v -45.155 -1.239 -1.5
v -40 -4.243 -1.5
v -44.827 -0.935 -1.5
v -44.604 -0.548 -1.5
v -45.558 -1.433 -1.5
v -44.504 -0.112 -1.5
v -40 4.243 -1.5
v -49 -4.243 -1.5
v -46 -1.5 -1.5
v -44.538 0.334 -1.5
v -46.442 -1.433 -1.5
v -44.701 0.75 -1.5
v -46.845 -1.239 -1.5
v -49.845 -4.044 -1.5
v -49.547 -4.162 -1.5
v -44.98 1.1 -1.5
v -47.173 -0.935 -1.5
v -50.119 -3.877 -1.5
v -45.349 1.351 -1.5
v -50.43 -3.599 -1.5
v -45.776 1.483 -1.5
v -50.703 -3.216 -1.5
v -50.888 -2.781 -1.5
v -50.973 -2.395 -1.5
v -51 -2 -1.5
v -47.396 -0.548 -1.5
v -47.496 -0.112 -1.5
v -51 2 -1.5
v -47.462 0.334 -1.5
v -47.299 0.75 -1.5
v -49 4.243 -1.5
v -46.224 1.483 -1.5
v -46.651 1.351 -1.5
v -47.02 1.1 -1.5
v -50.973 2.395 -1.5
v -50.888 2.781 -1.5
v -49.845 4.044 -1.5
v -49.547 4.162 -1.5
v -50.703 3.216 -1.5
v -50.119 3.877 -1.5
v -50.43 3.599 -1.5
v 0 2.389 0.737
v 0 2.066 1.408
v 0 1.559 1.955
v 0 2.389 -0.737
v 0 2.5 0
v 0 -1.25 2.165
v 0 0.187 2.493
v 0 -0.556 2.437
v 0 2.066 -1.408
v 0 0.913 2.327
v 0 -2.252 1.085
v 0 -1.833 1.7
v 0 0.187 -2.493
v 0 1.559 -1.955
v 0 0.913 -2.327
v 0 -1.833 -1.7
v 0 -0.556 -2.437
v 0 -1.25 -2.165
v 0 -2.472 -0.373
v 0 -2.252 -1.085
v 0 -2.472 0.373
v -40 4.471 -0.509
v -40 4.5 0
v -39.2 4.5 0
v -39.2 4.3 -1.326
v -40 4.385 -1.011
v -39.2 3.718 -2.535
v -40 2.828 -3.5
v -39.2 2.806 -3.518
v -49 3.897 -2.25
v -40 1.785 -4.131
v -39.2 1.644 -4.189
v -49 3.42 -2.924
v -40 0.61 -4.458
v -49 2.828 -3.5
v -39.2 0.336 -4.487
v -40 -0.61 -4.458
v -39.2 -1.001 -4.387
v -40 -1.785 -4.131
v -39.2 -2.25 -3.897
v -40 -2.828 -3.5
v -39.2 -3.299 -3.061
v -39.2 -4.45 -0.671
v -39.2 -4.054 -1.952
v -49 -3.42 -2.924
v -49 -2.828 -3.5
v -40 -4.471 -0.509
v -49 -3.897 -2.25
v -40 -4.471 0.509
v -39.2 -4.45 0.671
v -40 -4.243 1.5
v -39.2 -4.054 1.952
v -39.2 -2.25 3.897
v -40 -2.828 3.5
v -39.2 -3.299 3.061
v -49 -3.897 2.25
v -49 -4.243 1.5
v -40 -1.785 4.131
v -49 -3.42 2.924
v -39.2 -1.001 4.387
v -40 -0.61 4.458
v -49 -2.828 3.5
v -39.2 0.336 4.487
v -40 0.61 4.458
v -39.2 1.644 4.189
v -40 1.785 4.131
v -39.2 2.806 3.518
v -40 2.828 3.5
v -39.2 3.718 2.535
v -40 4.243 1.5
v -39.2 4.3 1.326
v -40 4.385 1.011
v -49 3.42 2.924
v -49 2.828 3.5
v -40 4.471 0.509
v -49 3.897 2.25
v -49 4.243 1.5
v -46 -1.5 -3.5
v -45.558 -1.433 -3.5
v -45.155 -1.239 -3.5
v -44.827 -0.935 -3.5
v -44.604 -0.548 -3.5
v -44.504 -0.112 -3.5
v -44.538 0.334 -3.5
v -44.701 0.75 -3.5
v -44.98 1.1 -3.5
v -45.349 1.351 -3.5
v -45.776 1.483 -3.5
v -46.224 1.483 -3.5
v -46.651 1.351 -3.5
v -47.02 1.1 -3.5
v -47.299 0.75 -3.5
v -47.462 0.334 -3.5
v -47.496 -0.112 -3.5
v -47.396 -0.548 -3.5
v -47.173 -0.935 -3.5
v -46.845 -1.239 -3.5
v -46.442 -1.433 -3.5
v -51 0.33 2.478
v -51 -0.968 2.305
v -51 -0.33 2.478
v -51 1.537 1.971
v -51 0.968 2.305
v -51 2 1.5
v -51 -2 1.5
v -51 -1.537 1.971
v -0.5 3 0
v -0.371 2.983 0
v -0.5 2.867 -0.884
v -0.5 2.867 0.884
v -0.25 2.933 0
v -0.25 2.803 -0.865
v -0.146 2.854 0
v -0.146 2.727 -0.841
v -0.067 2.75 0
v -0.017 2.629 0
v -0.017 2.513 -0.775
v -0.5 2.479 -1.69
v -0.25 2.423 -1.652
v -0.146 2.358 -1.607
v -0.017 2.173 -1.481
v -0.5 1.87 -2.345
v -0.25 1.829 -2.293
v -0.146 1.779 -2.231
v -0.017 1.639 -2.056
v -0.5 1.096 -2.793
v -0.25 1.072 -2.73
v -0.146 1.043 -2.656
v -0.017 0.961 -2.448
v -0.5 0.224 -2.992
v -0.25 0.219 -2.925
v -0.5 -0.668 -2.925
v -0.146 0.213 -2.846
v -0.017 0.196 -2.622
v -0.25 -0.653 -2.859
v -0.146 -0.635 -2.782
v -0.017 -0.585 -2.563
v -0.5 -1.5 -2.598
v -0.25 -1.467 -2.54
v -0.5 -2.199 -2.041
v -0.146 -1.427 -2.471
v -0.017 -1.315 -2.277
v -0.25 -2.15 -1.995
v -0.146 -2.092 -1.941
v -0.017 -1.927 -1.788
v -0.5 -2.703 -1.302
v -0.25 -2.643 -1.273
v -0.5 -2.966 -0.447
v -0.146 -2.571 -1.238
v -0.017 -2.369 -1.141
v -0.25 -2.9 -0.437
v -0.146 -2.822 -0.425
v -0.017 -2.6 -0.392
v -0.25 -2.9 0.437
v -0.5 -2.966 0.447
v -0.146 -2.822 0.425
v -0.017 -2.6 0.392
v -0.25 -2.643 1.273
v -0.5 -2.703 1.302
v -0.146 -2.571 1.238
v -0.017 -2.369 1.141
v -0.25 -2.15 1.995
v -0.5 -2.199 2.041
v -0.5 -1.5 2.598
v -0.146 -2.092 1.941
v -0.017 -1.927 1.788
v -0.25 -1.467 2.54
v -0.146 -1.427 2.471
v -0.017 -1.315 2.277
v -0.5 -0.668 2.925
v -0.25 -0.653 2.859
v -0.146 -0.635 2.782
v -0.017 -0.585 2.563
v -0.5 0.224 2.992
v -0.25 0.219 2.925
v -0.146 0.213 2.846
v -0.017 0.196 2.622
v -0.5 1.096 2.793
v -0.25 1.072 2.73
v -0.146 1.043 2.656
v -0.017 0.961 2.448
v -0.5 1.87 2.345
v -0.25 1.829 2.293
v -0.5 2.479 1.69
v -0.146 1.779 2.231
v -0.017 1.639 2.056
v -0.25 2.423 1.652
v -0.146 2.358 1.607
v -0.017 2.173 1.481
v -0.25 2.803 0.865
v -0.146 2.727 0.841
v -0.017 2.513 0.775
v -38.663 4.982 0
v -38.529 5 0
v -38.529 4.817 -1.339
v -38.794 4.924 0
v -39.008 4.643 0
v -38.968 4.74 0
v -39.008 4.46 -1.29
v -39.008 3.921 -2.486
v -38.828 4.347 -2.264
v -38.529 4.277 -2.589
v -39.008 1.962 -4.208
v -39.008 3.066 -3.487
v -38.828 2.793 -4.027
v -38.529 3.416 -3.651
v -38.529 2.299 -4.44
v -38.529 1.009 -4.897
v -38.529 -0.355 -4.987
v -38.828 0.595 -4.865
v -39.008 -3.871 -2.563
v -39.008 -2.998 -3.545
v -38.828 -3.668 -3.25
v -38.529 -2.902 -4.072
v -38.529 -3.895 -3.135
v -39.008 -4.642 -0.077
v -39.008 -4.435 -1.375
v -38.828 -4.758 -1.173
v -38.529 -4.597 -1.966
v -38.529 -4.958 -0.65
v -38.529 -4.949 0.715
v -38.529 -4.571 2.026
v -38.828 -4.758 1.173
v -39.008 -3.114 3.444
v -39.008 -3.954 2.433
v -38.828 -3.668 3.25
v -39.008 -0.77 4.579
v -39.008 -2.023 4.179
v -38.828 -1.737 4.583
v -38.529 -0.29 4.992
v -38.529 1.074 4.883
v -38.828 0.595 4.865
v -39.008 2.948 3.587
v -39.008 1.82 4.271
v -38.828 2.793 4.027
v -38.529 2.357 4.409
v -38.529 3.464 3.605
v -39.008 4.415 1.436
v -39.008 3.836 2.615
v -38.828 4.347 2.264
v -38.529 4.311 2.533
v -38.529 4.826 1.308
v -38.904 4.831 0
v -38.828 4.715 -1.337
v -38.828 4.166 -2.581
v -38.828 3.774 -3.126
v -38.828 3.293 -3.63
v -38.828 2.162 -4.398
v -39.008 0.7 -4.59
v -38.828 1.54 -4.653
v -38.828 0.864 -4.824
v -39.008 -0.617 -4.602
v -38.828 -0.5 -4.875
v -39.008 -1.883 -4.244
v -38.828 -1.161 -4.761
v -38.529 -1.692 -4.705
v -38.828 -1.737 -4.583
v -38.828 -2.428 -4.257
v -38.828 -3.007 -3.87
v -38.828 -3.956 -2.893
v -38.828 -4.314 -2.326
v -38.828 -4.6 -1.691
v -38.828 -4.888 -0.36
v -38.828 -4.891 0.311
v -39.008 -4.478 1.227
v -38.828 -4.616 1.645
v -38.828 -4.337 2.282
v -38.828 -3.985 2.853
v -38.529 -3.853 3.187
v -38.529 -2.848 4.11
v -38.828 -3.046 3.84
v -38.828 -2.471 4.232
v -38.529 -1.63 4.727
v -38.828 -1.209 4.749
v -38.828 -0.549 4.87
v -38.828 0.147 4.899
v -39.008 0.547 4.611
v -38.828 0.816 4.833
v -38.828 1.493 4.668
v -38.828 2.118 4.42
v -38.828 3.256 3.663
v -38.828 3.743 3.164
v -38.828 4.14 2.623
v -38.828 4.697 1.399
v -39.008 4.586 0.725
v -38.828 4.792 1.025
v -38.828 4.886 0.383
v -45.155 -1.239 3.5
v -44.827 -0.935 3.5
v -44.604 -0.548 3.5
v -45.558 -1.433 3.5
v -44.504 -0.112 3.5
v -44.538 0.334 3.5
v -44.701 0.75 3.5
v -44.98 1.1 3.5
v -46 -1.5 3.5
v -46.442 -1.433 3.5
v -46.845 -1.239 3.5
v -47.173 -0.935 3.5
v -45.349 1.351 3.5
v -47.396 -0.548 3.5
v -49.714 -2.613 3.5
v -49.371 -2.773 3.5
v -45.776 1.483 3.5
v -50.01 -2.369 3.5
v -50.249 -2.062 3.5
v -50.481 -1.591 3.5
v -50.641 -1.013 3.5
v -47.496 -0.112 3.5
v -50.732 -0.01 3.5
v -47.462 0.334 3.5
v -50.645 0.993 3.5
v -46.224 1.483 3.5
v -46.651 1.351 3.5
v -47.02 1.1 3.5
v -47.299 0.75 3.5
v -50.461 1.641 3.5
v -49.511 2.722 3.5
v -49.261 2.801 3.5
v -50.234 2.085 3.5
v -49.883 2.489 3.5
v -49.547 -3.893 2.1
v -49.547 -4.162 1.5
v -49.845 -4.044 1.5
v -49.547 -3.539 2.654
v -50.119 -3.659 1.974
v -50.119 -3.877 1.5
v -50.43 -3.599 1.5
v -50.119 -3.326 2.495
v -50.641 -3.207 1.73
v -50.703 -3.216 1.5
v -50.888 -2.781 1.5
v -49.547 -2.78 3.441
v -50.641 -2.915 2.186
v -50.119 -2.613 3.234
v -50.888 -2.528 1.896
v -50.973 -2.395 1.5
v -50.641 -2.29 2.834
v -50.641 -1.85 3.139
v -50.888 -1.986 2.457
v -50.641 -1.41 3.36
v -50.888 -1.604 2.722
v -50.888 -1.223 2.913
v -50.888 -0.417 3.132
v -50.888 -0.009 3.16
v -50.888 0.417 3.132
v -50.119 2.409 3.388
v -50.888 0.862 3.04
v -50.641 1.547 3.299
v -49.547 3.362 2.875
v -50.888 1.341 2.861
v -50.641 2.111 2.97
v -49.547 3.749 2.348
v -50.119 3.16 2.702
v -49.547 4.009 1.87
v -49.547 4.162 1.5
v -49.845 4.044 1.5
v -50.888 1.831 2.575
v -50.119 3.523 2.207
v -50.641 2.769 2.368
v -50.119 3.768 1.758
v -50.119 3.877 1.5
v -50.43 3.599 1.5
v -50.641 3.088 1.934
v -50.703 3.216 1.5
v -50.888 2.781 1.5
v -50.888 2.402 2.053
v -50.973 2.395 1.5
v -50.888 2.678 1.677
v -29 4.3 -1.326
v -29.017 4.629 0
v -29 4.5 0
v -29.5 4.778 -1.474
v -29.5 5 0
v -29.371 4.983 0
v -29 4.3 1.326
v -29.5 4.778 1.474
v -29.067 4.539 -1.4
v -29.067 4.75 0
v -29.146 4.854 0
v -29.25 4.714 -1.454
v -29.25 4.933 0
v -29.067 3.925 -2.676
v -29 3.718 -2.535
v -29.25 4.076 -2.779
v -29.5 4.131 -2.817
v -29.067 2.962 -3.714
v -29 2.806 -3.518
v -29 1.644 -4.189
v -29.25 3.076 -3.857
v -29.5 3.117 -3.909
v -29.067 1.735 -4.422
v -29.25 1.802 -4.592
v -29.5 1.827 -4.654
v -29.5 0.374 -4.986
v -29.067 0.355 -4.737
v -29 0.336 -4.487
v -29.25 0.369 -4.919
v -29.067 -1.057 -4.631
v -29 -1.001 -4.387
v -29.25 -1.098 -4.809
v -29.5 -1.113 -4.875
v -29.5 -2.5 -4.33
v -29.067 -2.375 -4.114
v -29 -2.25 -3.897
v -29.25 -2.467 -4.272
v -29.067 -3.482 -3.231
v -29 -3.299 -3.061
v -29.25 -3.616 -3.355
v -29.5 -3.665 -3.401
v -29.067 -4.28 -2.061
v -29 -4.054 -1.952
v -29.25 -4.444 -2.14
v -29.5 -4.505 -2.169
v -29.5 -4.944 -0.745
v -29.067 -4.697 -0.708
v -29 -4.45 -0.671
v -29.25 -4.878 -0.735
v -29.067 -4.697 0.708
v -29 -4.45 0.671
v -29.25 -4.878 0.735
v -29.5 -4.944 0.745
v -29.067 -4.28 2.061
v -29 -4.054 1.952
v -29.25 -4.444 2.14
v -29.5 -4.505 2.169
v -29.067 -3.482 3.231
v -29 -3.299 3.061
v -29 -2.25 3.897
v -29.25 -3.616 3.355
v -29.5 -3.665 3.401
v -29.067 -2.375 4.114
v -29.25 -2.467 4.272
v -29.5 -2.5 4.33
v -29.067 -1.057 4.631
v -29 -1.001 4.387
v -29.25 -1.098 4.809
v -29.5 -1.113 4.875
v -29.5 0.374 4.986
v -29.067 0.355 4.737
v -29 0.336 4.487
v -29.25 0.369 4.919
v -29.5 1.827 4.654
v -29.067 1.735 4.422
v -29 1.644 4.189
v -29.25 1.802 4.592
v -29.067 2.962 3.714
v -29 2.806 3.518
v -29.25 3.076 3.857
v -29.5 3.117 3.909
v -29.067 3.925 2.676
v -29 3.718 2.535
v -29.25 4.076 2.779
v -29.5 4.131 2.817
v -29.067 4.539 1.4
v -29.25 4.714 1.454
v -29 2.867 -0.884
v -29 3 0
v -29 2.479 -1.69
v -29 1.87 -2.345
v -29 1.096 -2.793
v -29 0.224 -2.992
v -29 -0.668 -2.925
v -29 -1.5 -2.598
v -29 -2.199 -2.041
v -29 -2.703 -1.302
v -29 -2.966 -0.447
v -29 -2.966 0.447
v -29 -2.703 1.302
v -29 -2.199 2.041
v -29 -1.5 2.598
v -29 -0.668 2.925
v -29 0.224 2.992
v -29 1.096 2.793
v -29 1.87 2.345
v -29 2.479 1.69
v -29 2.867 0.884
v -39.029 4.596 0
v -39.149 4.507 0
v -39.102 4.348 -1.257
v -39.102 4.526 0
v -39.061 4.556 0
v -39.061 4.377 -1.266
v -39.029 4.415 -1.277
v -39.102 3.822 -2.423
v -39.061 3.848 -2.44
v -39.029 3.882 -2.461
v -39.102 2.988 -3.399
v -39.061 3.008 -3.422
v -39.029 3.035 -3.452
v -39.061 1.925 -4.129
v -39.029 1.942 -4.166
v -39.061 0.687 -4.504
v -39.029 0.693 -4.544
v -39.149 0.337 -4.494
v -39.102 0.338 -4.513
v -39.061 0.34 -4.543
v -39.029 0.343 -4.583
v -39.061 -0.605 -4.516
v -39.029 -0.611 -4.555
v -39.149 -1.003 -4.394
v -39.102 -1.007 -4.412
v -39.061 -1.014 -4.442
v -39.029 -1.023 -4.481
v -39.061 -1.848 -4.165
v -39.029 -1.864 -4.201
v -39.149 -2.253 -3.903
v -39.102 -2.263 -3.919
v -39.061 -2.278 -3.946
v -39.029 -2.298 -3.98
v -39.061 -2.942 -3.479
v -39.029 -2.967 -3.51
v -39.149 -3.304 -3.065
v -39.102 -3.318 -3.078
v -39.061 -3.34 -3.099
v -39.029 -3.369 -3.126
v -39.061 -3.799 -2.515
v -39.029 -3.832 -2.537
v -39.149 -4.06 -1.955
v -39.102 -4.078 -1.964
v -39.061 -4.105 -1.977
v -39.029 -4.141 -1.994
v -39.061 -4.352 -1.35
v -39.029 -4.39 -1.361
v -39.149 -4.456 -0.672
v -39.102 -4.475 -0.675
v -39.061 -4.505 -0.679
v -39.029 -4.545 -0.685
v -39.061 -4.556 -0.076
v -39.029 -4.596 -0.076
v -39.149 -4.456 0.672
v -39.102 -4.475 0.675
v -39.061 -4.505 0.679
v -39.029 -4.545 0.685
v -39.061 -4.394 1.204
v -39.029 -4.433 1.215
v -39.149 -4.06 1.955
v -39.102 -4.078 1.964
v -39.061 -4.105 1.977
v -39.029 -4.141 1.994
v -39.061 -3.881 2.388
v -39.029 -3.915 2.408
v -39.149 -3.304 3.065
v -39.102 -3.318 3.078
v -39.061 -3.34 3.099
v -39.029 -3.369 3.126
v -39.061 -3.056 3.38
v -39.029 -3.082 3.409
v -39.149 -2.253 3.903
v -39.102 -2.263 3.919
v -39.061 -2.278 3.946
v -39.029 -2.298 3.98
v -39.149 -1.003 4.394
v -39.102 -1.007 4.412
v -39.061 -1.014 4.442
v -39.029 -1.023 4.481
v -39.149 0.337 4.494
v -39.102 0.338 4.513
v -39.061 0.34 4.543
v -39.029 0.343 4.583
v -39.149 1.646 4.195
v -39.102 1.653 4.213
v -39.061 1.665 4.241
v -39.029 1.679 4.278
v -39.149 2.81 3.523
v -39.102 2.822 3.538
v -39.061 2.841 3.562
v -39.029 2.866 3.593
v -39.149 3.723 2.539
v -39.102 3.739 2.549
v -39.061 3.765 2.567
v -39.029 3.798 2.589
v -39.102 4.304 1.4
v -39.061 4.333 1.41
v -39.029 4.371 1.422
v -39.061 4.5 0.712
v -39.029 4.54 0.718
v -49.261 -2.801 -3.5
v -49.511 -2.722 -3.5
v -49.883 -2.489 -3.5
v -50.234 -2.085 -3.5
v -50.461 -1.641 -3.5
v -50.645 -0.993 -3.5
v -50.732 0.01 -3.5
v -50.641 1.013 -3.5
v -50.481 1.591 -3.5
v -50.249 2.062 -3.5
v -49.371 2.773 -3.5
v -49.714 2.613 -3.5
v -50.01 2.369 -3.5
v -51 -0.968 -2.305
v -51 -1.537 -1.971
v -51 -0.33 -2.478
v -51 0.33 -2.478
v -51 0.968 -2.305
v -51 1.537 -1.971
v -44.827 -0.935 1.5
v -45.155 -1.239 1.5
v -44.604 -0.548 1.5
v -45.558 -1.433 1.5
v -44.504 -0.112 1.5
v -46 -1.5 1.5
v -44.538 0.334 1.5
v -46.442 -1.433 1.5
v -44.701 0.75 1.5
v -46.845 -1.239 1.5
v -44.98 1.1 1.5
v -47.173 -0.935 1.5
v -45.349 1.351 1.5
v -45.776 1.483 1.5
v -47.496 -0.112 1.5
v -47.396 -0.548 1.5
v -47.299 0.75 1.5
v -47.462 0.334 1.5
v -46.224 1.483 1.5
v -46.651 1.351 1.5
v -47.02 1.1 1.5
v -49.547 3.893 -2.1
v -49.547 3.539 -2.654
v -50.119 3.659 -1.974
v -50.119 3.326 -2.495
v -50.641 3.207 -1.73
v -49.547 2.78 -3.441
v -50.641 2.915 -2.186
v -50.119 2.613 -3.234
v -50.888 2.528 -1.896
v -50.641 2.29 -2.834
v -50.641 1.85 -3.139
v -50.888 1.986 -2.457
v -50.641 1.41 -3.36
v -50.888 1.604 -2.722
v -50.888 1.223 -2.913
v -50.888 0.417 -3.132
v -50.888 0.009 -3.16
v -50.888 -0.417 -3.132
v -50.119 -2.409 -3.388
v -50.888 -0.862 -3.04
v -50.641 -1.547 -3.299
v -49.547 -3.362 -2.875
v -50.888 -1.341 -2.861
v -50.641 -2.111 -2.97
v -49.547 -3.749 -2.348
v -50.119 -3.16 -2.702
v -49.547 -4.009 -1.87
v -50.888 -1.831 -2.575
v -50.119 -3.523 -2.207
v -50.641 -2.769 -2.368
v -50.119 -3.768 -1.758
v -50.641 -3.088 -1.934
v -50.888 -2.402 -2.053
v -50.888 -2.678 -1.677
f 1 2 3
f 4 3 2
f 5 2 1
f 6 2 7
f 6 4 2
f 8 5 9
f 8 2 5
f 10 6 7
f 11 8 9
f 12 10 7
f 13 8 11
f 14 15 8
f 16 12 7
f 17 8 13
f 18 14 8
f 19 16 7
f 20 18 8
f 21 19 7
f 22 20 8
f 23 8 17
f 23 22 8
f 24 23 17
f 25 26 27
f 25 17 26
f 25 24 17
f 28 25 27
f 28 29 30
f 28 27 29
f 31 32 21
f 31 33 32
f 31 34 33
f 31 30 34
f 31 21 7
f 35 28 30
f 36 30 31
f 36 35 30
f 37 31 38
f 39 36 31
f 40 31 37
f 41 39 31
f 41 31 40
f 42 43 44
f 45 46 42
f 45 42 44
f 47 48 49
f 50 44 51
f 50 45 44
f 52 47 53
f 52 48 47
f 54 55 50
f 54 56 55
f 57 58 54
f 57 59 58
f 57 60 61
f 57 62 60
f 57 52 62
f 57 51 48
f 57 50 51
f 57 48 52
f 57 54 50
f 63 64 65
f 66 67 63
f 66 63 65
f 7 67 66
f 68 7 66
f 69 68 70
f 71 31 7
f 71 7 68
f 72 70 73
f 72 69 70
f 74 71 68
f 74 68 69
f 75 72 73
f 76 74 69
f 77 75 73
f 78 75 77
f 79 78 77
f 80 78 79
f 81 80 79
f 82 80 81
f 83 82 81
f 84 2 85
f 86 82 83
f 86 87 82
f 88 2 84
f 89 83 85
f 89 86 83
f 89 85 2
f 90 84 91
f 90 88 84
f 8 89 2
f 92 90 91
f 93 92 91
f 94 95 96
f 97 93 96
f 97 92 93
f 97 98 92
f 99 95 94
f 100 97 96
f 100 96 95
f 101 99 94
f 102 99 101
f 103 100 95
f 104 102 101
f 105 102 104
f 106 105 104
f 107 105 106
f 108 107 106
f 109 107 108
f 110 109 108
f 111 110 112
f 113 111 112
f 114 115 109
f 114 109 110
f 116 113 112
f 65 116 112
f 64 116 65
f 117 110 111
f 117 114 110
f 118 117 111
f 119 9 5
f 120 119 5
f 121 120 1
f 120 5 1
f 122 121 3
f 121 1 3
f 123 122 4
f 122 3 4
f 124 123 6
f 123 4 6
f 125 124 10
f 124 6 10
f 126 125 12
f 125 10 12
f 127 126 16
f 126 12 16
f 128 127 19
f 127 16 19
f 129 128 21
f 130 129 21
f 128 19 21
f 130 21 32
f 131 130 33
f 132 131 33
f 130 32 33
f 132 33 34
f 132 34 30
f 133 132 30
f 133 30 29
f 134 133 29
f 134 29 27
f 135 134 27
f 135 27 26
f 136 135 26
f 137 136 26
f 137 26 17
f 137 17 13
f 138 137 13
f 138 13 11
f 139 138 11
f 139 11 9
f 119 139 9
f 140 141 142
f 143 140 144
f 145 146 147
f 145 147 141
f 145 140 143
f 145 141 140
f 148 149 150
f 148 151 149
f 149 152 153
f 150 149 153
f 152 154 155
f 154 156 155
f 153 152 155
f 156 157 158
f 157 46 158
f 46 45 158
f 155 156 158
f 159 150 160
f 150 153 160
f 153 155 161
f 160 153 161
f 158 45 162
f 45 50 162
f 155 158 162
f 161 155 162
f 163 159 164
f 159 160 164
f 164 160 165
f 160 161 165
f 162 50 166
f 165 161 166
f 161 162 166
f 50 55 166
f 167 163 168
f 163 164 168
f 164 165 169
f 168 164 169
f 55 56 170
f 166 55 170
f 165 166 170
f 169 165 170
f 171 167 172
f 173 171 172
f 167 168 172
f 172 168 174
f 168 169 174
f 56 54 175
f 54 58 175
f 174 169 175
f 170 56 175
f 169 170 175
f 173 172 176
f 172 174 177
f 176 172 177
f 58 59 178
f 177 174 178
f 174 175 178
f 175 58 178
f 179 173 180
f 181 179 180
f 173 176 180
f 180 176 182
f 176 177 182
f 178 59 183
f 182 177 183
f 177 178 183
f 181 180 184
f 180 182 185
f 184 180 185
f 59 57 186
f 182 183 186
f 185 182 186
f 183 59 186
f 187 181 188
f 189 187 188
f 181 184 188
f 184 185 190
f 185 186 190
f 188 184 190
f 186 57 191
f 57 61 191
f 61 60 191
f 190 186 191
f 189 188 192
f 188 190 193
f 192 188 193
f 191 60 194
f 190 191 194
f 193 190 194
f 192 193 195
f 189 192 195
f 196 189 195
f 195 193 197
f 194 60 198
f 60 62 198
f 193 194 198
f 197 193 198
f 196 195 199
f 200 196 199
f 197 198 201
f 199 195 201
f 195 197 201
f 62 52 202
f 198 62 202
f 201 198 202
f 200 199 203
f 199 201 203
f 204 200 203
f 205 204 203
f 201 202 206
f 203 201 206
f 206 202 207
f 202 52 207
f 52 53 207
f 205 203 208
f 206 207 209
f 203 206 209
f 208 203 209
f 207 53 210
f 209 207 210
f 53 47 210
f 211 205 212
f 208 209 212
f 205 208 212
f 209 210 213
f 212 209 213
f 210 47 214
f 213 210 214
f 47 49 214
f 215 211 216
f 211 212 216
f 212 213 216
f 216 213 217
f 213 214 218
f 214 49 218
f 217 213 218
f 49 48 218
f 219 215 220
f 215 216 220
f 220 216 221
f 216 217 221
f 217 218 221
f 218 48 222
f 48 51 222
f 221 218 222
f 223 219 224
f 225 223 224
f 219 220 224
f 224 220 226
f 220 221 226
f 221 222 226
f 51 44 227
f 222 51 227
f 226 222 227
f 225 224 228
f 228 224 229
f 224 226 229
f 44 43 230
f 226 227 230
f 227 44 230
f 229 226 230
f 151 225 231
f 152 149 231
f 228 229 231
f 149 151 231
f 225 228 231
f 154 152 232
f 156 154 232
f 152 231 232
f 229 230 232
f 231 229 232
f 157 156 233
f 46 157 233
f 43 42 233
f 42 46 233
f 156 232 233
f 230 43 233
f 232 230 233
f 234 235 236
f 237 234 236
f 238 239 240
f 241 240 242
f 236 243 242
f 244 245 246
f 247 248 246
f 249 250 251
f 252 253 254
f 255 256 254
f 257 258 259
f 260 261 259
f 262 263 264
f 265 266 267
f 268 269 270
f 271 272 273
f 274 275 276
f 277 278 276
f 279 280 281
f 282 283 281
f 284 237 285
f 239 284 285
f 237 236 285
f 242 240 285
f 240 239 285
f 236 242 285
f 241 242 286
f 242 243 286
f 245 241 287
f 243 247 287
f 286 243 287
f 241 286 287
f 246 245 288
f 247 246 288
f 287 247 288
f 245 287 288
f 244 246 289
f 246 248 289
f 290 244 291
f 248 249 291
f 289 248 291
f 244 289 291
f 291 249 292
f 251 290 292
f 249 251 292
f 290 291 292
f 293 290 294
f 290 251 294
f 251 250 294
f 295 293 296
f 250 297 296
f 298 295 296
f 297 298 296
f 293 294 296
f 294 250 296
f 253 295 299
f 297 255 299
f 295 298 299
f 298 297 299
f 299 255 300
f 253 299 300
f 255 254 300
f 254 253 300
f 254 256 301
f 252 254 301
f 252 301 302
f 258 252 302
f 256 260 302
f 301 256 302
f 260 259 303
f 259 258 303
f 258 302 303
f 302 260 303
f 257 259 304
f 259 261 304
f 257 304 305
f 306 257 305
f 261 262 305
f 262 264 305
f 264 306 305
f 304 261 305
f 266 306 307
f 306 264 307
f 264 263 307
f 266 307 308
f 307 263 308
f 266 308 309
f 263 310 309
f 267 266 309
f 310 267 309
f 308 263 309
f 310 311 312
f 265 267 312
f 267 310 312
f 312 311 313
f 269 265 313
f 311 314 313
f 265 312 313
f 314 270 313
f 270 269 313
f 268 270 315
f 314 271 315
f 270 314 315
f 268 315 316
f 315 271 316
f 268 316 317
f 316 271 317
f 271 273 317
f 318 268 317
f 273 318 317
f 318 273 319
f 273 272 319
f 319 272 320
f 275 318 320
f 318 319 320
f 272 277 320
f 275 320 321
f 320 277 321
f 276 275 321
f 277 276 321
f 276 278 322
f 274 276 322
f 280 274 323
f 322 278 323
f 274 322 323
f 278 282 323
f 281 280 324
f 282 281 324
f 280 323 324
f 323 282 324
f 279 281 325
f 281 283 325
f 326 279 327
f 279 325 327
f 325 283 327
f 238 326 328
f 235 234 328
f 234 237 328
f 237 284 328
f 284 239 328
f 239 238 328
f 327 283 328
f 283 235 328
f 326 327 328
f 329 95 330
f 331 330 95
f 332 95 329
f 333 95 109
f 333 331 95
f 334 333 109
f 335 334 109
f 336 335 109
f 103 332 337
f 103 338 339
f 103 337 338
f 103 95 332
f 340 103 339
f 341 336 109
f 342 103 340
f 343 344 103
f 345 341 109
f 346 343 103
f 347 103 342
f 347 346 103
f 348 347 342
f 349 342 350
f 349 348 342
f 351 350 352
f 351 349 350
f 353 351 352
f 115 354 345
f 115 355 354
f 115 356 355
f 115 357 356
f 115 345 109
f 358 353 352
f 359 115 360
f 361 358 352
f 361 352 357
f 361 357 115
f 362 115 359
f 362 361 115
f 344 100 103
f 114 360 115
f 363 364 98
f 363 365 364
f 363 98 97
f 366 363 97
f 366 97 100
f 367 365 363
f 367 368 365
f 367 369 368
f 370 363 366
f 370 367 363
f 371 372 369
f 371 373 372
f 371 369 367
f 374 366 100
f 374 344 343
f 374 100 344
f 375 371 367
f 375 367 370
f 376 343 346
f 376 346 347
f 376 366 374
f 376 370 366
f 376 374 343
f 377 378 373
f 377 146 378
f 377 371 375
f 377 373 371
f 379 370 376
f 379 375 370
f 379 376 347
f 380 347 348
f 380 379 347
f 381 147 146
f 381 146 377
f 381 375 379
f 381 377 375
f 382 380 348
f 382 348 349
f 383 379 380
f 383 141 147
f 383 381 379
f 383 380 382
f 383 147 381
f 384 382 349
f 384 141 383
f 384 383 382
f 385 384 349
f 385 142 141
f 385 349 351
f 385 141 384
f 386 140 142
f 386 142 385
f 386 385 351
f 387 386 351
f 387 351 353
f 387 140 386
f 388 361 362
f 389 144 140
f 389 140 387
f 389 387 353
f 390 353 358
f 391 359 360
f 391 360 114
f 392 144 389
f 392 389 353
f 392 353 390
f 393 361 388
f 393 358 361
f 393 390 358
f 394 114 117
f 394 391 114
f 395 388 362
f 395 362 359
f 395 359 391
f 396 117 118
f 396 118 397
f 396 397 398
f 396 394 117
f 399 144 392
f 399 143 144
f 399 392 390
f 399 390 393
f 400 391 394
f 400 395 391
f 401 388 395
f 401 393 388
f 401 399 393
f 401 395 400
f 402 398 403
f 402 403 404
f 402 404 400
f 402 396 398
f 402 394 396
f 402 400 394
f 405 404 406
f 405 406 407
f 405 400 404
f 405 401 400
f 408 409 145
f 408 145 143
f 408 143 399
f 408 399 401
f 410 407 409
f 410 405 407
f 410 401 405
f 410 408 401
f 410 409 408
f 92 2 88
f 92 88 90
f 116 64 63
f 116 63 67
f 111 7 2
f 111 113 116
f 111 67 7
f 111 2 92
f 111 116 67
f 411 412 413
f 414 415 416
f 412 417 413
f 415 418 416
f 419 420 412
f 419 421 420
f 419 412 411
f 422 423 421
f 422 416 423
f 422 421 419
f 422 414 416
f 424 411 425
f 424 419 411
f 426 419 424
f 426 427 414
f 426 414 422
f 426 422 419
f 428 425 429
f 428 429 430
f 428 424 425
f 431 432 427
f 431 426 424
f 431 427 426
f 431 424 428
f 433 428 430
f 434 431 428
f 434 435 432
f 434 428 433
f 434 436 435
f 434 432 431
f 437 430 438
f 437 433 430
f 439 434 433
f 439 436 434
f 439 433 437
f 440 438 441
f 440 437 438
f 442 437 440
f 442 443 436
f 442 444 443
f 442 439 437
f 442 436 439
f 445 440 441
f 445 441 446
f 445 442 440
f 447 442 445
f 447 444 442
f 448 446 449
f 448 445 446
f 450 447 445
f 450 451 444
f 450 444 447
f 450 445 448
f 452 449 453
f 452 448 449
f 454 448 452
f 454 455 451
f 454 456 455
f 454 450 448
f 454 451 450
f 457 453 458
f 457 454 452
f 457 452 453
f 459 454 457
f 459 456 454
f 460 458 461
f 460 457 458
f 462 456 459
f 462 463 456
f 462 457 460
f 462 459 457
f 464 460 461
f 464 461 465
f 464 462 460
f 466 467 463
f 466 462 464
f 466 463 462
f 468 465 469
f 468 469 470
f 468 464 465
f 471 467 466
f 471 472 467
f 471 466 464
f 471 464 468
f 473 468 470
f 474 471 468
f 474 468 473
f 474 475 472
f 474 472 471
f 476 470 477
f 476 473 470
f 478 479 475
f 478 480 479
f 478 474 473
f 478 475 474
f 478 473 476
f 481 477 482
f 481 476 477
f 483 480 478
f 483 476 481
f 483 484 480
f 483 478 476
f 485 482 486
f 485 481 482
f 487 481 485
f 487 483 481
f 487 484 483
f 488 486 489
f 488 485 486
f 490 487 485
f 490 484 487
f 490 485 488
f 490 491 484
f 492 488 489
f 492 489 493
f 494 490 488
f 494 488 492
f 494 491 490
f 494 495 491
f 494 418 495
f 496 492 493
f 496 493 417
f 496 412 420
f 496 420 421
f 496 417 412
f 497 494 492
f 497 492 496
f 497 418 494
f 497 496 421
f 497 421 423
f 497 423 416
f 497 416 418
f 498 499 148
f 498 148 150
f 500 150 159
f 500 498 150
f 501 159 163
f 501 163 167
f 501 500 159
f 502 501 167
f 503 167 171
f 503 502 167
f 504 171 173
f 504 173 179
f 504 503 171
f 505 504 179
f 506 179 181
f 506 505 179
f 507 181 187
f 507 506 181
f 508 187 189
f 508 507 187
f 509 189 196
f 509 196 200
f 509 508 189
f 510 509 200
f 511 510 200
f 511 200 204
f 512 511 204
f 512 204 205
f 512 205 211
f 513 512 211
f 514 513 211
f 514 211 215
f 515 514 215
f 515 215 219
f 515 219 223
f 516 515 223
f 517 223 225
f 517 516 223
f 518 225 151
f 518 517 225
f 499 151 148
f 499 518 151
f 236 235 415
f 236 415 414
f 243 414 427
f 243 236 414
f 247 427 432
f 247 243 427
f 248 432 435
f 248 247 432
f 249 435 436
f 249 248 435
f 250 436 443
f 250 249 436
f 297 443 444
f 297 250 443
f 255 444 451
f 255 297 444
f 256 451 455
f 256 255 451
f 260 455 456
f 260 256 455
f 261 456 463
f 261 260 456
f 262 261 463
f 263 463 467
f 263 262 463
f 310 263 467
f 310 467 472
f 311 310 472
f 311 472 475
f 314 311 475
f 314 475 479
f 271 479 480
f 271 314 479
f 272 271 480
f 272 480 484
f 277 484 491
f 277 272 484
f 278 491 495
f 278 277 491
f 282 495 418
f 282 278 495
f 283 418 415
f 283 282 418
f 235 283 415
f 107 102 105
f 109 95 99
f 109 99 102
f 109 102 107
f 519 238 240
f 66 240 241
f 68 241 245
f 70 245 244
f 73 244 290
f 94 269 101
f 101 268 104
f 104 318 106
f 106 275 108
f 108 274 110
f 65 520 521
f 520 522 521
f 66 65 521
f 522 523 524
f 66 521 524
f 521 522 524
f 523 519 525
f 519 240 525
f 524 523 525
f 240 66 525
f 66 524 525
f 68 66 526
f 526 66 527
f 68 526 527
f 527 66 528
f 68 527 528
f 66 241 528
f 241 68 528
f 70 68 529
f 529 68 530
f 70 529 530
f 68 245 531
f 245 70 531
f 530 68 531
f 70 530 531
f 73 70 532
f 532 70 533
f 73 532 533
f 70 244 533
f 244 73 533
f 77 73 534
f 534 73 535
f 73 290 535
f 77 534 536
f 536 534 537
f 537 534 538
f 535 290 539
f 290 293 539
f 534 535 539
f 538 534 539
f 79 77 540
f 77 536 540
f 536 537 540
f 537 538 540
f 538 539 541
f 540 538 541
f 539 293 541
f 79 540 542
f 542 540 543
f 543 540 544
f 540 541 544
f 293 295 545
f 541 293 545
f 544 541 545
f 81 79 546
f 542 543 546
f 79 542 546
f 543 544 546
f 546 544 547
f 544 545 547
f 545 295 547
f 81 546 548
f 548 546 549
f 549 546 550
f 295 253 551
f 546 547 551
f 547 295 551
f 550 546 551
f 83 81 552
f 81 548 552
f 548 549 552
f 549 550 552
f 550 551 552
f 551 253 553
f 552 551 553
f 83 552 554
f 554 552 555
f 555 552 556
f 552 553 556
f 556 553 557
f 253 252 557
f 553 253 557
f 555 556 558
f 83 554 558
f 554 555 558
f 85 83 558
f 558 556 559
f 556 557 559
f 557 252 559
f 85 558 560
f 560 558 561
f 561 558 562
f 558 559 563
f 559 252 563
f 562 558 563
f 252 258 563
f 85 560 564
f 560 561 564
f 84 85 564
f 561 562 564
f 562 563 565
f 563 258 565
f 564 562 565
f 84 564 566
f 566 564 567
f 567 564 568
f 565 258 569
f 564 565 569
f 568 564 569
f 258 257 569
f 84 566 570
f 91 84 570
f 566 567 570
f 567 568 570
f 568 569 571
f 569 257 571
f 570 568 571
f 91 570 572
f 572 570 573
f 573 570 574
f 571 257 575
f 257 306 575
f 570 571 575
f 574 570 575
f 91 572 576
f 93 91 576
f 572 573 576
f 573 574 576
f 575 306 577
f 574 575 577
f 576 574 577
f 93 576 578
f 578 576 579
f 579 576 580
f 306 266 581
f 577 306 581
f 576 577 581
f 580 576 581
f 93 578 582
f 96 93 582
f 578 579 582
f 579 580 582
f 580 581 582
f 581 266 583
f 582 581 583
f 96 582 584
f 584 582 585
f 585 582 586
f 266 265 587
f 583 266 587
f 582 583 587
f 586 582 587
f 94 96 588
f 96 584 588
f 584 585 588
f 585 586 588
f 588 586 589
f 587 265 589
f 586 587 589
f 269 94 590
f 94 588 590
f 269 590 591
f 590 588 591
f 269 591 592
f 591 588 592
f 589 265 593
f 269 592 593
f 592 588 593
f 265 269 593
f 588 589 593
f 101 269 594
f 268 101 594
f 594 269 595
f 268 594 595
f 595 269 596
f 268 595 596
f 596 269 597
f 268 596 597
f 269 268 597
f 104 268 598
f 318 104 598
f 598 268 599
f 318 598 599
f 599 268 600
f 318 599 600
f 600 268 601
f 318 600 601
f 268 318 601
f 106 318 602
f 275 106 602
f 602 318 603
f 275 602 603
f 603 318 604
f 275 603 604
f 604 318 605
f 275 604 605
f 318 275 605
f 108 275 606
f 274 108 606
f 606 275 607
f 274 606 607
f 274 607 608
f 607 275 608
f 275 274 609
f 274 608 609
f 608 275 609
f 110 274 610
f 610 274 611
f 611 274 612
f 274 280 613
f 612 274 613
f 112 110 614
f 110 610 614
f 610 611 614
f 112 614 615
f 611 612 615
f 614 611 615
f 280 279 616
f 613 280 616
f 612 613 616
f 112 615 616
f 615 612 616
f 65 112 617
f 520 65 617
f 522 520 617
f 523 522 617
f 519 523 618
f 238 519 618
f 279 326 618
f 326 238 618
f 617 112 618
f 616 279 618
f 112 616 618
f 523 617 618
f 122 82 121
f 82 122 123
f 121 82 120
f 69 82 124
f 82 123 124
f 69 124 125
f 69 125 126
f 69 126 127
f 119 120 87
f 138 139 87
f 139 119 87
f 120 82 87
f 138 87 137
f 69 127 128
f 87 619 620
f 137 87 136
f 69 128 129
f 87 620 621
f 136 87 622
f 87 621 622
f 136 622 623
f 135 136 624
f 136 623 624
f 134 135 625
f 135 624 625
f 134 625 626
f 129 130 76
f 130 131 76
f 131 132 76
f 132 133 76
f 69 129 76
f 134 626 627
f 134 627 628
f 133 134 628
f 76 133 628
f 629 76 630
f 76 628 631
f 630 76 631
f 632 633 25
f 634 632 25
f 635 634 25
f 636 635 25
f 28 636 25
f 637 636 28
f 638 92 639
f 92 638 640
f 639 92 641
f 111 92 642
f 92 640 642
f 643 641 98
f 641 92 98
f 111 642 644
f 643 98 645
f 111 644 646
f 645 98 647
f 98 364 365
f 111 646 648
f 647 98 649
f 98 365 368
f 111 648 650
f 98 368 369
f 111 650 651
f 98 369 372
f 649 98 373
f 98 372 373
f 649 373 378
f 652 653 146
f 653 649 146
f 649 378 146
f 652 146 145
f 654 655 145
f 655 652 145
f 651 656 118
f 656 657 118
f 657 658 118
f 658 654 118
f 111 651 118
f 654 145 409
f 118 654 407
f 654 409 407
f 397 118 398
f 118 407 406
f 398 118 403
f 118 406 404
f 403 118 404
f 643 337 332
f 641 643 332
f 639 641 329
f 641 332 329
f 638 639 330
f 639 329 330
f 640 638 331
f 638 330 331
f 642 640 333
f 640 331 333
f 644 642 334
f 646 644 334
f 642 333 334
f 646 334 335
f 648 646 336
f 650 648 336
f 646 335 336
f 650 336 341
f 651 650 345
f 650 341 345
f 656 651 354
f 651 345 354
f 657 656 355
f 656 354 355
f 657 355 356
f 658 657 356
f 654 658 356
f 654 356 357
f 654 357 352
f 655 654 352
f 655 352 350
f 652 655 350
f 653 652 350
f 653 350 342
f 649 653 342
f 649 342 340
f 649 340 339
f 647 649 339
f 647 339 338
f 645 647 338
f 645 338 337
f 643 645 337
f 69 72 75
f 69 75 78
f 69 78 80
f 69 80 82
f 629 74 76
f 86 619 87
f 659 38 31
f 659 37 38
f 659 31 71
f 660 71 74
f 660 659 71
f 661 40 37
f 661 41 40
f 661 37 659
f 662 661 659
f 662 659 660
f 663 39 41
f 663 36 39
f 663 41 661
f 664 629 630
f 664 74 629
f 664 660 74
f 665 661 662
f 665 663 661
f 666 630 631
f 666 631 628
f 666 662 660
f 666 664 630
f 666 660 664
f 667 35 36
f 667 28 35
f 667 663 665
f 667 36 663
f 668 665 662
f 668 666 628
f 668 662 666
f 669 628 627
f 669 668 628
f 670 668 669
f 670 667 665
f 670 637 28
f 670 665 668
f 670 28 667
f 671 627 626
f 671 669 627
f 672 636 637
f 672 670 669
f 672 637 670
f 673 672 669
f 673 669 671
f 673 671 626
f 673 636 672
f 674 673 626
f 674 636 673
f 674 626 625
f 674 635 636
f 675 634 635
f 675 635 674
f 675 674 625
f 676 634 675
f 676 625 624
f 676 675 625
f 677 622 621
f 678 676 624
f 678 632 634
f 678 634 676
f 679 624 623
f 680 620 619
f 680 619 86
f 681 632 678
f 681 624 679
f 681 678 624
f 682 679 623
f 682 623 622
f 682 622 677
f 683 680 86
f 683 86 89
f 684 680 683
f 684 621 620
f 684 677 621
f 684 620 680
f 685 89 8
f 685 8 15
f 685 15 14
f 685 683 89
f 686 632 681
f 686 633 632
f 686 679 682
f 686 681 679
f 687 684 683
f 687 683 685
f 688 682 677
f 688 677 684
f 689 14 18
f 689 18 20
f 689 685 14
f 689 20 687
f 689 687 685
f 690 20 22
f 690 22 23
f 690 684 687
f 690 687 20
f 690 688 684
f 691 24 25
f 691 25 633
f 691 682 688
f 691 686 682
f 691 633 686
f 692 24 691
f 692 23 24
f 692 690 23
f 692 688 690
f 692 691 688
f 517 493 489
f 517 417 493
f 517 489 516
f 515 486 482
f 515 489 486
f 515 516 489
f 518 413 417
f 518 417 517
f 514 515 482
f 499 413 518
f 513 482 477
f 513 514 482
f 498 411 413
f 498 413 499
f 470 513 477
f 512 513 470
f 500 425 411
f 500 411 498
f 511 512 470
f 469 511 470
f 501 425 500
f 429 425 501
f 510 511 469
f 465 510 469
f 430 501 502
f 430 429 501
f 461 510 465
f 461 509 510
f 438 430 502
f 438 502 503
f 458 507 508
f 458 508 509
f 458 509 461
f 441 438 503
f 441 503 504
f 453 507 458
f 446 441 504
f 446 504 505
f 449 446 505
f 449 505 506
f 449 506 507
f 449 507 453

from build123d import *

# Parameters (mm, degrees)
FILLET_1_R          = 2
SKETCH_2_R          = 7.321356554
SKETCH_2_W          = 2
SKETCH_2_H          = 11.961651185
CUT_EXTRUDE_1_DEPTH = 11
CUT_EXTRUDE_2_REACH = 53.945
SKETCH_3_R          = 1.5
FILLET_2_R          = 0.2
FILLET_3_R          = 0.5
FILLET_4_R          = 0.5


with BuildPart() as part:
    # 草图1 → 旋转1 (revolve)
    with BuildSketch(Plane.XY):
        Polygon((0, 0), (0, 3), (-29, 3), (-29, 5), (-39, 5), (-39, 4.5), (-51, 4.5), (-51, 0), align=None)
    revolve(axis=Axis((0, 0, 0), (-1, 0, 0)))

    # 圆角1
    fillet_1_edges = [part.edges().sort_by_distance(p)[0] for p in [
        (-51, -4.5, 0),
    ]]
    fillet(fillet_1_edges, radius=FILLET_1_R)

    # 草图2 → 切除-拉伸1 (cut)
    with BuildSketch(Plane.ZY.offset(51)):
        Circle(SKETCH_2_R)
        with Locations((2.5, -0.178000761)):
            Rectangle(SKETCH_2_W, SKETCH_2_H, mode=Mode.SUBTRACT)
        with Locations((-2.5, -0.178000761)):
            Rectangle(SKETCH_2_W, SKETCH_2_H, mode=Mode.SUBTRACT)
    extrude(amount=-CUT_EXTRUDE_1_DEPTH, mode=Mode.SUBTRACT)

    # 切除-拉伸2: up to this face of the body (flat: up to its plane)
    cut_extrude_2_end = Plane(part.part.faces().sort_by_distance((-45.204174513, -1.4e-08, -3.5))[0])
    # 草图3 → 切除-拉伸2 (cut, up to the picked face)
    with BuildSketch(Plane.XY.offset(3.5), mode=Mode.PRIVATE) as cut_extrude_2_sk1:
        with Locations(Location((-46, 0, 0), (0, 0, 270))):
            Circle(SKETCH_3_R)
    cut_extrude_2_tool1 = split(extrude(cut_extrude_2_sk1.sketch, amount=-CUT_EXTRUDE_2_REACH, mode=Mode.PRIVATE), bisect_by=cut_extrude_2_end, keep=Keep.BOTH, mode=Mode.PRIVATE)
    add(cut_extrude_2_tool1.solids().sort_by(Axis((-46, 0, 3.5), (0, 0, -1)))[0], mode=Mode.SUBTRACT)

    # 圆角2
    fillet_2_edges = [part.edges().sort_by_distance(p)[0] for p in [
        (-39, -4.5, 0),
    ]]
    fillet(fillet_2_edges, radius=FILLET_2_R)

    # 圆角3
    fillet_3_edges = [part.edges().sort_by_distance(p)[0] for p in [
        (0, -3, 0),
    ]]
    fillet(fillet_3_edges, radius=FILLET_3_R)

    # 圆角4
    fillet_4_edges = [part.edges().sort_by_distance(p)[0] for p in [
        (-29, -5, 0),
        (-39, -5, 0),
    ]]
    fillet(fillet_4_edges, radius=FILLET_4_R)


solid = part.part
